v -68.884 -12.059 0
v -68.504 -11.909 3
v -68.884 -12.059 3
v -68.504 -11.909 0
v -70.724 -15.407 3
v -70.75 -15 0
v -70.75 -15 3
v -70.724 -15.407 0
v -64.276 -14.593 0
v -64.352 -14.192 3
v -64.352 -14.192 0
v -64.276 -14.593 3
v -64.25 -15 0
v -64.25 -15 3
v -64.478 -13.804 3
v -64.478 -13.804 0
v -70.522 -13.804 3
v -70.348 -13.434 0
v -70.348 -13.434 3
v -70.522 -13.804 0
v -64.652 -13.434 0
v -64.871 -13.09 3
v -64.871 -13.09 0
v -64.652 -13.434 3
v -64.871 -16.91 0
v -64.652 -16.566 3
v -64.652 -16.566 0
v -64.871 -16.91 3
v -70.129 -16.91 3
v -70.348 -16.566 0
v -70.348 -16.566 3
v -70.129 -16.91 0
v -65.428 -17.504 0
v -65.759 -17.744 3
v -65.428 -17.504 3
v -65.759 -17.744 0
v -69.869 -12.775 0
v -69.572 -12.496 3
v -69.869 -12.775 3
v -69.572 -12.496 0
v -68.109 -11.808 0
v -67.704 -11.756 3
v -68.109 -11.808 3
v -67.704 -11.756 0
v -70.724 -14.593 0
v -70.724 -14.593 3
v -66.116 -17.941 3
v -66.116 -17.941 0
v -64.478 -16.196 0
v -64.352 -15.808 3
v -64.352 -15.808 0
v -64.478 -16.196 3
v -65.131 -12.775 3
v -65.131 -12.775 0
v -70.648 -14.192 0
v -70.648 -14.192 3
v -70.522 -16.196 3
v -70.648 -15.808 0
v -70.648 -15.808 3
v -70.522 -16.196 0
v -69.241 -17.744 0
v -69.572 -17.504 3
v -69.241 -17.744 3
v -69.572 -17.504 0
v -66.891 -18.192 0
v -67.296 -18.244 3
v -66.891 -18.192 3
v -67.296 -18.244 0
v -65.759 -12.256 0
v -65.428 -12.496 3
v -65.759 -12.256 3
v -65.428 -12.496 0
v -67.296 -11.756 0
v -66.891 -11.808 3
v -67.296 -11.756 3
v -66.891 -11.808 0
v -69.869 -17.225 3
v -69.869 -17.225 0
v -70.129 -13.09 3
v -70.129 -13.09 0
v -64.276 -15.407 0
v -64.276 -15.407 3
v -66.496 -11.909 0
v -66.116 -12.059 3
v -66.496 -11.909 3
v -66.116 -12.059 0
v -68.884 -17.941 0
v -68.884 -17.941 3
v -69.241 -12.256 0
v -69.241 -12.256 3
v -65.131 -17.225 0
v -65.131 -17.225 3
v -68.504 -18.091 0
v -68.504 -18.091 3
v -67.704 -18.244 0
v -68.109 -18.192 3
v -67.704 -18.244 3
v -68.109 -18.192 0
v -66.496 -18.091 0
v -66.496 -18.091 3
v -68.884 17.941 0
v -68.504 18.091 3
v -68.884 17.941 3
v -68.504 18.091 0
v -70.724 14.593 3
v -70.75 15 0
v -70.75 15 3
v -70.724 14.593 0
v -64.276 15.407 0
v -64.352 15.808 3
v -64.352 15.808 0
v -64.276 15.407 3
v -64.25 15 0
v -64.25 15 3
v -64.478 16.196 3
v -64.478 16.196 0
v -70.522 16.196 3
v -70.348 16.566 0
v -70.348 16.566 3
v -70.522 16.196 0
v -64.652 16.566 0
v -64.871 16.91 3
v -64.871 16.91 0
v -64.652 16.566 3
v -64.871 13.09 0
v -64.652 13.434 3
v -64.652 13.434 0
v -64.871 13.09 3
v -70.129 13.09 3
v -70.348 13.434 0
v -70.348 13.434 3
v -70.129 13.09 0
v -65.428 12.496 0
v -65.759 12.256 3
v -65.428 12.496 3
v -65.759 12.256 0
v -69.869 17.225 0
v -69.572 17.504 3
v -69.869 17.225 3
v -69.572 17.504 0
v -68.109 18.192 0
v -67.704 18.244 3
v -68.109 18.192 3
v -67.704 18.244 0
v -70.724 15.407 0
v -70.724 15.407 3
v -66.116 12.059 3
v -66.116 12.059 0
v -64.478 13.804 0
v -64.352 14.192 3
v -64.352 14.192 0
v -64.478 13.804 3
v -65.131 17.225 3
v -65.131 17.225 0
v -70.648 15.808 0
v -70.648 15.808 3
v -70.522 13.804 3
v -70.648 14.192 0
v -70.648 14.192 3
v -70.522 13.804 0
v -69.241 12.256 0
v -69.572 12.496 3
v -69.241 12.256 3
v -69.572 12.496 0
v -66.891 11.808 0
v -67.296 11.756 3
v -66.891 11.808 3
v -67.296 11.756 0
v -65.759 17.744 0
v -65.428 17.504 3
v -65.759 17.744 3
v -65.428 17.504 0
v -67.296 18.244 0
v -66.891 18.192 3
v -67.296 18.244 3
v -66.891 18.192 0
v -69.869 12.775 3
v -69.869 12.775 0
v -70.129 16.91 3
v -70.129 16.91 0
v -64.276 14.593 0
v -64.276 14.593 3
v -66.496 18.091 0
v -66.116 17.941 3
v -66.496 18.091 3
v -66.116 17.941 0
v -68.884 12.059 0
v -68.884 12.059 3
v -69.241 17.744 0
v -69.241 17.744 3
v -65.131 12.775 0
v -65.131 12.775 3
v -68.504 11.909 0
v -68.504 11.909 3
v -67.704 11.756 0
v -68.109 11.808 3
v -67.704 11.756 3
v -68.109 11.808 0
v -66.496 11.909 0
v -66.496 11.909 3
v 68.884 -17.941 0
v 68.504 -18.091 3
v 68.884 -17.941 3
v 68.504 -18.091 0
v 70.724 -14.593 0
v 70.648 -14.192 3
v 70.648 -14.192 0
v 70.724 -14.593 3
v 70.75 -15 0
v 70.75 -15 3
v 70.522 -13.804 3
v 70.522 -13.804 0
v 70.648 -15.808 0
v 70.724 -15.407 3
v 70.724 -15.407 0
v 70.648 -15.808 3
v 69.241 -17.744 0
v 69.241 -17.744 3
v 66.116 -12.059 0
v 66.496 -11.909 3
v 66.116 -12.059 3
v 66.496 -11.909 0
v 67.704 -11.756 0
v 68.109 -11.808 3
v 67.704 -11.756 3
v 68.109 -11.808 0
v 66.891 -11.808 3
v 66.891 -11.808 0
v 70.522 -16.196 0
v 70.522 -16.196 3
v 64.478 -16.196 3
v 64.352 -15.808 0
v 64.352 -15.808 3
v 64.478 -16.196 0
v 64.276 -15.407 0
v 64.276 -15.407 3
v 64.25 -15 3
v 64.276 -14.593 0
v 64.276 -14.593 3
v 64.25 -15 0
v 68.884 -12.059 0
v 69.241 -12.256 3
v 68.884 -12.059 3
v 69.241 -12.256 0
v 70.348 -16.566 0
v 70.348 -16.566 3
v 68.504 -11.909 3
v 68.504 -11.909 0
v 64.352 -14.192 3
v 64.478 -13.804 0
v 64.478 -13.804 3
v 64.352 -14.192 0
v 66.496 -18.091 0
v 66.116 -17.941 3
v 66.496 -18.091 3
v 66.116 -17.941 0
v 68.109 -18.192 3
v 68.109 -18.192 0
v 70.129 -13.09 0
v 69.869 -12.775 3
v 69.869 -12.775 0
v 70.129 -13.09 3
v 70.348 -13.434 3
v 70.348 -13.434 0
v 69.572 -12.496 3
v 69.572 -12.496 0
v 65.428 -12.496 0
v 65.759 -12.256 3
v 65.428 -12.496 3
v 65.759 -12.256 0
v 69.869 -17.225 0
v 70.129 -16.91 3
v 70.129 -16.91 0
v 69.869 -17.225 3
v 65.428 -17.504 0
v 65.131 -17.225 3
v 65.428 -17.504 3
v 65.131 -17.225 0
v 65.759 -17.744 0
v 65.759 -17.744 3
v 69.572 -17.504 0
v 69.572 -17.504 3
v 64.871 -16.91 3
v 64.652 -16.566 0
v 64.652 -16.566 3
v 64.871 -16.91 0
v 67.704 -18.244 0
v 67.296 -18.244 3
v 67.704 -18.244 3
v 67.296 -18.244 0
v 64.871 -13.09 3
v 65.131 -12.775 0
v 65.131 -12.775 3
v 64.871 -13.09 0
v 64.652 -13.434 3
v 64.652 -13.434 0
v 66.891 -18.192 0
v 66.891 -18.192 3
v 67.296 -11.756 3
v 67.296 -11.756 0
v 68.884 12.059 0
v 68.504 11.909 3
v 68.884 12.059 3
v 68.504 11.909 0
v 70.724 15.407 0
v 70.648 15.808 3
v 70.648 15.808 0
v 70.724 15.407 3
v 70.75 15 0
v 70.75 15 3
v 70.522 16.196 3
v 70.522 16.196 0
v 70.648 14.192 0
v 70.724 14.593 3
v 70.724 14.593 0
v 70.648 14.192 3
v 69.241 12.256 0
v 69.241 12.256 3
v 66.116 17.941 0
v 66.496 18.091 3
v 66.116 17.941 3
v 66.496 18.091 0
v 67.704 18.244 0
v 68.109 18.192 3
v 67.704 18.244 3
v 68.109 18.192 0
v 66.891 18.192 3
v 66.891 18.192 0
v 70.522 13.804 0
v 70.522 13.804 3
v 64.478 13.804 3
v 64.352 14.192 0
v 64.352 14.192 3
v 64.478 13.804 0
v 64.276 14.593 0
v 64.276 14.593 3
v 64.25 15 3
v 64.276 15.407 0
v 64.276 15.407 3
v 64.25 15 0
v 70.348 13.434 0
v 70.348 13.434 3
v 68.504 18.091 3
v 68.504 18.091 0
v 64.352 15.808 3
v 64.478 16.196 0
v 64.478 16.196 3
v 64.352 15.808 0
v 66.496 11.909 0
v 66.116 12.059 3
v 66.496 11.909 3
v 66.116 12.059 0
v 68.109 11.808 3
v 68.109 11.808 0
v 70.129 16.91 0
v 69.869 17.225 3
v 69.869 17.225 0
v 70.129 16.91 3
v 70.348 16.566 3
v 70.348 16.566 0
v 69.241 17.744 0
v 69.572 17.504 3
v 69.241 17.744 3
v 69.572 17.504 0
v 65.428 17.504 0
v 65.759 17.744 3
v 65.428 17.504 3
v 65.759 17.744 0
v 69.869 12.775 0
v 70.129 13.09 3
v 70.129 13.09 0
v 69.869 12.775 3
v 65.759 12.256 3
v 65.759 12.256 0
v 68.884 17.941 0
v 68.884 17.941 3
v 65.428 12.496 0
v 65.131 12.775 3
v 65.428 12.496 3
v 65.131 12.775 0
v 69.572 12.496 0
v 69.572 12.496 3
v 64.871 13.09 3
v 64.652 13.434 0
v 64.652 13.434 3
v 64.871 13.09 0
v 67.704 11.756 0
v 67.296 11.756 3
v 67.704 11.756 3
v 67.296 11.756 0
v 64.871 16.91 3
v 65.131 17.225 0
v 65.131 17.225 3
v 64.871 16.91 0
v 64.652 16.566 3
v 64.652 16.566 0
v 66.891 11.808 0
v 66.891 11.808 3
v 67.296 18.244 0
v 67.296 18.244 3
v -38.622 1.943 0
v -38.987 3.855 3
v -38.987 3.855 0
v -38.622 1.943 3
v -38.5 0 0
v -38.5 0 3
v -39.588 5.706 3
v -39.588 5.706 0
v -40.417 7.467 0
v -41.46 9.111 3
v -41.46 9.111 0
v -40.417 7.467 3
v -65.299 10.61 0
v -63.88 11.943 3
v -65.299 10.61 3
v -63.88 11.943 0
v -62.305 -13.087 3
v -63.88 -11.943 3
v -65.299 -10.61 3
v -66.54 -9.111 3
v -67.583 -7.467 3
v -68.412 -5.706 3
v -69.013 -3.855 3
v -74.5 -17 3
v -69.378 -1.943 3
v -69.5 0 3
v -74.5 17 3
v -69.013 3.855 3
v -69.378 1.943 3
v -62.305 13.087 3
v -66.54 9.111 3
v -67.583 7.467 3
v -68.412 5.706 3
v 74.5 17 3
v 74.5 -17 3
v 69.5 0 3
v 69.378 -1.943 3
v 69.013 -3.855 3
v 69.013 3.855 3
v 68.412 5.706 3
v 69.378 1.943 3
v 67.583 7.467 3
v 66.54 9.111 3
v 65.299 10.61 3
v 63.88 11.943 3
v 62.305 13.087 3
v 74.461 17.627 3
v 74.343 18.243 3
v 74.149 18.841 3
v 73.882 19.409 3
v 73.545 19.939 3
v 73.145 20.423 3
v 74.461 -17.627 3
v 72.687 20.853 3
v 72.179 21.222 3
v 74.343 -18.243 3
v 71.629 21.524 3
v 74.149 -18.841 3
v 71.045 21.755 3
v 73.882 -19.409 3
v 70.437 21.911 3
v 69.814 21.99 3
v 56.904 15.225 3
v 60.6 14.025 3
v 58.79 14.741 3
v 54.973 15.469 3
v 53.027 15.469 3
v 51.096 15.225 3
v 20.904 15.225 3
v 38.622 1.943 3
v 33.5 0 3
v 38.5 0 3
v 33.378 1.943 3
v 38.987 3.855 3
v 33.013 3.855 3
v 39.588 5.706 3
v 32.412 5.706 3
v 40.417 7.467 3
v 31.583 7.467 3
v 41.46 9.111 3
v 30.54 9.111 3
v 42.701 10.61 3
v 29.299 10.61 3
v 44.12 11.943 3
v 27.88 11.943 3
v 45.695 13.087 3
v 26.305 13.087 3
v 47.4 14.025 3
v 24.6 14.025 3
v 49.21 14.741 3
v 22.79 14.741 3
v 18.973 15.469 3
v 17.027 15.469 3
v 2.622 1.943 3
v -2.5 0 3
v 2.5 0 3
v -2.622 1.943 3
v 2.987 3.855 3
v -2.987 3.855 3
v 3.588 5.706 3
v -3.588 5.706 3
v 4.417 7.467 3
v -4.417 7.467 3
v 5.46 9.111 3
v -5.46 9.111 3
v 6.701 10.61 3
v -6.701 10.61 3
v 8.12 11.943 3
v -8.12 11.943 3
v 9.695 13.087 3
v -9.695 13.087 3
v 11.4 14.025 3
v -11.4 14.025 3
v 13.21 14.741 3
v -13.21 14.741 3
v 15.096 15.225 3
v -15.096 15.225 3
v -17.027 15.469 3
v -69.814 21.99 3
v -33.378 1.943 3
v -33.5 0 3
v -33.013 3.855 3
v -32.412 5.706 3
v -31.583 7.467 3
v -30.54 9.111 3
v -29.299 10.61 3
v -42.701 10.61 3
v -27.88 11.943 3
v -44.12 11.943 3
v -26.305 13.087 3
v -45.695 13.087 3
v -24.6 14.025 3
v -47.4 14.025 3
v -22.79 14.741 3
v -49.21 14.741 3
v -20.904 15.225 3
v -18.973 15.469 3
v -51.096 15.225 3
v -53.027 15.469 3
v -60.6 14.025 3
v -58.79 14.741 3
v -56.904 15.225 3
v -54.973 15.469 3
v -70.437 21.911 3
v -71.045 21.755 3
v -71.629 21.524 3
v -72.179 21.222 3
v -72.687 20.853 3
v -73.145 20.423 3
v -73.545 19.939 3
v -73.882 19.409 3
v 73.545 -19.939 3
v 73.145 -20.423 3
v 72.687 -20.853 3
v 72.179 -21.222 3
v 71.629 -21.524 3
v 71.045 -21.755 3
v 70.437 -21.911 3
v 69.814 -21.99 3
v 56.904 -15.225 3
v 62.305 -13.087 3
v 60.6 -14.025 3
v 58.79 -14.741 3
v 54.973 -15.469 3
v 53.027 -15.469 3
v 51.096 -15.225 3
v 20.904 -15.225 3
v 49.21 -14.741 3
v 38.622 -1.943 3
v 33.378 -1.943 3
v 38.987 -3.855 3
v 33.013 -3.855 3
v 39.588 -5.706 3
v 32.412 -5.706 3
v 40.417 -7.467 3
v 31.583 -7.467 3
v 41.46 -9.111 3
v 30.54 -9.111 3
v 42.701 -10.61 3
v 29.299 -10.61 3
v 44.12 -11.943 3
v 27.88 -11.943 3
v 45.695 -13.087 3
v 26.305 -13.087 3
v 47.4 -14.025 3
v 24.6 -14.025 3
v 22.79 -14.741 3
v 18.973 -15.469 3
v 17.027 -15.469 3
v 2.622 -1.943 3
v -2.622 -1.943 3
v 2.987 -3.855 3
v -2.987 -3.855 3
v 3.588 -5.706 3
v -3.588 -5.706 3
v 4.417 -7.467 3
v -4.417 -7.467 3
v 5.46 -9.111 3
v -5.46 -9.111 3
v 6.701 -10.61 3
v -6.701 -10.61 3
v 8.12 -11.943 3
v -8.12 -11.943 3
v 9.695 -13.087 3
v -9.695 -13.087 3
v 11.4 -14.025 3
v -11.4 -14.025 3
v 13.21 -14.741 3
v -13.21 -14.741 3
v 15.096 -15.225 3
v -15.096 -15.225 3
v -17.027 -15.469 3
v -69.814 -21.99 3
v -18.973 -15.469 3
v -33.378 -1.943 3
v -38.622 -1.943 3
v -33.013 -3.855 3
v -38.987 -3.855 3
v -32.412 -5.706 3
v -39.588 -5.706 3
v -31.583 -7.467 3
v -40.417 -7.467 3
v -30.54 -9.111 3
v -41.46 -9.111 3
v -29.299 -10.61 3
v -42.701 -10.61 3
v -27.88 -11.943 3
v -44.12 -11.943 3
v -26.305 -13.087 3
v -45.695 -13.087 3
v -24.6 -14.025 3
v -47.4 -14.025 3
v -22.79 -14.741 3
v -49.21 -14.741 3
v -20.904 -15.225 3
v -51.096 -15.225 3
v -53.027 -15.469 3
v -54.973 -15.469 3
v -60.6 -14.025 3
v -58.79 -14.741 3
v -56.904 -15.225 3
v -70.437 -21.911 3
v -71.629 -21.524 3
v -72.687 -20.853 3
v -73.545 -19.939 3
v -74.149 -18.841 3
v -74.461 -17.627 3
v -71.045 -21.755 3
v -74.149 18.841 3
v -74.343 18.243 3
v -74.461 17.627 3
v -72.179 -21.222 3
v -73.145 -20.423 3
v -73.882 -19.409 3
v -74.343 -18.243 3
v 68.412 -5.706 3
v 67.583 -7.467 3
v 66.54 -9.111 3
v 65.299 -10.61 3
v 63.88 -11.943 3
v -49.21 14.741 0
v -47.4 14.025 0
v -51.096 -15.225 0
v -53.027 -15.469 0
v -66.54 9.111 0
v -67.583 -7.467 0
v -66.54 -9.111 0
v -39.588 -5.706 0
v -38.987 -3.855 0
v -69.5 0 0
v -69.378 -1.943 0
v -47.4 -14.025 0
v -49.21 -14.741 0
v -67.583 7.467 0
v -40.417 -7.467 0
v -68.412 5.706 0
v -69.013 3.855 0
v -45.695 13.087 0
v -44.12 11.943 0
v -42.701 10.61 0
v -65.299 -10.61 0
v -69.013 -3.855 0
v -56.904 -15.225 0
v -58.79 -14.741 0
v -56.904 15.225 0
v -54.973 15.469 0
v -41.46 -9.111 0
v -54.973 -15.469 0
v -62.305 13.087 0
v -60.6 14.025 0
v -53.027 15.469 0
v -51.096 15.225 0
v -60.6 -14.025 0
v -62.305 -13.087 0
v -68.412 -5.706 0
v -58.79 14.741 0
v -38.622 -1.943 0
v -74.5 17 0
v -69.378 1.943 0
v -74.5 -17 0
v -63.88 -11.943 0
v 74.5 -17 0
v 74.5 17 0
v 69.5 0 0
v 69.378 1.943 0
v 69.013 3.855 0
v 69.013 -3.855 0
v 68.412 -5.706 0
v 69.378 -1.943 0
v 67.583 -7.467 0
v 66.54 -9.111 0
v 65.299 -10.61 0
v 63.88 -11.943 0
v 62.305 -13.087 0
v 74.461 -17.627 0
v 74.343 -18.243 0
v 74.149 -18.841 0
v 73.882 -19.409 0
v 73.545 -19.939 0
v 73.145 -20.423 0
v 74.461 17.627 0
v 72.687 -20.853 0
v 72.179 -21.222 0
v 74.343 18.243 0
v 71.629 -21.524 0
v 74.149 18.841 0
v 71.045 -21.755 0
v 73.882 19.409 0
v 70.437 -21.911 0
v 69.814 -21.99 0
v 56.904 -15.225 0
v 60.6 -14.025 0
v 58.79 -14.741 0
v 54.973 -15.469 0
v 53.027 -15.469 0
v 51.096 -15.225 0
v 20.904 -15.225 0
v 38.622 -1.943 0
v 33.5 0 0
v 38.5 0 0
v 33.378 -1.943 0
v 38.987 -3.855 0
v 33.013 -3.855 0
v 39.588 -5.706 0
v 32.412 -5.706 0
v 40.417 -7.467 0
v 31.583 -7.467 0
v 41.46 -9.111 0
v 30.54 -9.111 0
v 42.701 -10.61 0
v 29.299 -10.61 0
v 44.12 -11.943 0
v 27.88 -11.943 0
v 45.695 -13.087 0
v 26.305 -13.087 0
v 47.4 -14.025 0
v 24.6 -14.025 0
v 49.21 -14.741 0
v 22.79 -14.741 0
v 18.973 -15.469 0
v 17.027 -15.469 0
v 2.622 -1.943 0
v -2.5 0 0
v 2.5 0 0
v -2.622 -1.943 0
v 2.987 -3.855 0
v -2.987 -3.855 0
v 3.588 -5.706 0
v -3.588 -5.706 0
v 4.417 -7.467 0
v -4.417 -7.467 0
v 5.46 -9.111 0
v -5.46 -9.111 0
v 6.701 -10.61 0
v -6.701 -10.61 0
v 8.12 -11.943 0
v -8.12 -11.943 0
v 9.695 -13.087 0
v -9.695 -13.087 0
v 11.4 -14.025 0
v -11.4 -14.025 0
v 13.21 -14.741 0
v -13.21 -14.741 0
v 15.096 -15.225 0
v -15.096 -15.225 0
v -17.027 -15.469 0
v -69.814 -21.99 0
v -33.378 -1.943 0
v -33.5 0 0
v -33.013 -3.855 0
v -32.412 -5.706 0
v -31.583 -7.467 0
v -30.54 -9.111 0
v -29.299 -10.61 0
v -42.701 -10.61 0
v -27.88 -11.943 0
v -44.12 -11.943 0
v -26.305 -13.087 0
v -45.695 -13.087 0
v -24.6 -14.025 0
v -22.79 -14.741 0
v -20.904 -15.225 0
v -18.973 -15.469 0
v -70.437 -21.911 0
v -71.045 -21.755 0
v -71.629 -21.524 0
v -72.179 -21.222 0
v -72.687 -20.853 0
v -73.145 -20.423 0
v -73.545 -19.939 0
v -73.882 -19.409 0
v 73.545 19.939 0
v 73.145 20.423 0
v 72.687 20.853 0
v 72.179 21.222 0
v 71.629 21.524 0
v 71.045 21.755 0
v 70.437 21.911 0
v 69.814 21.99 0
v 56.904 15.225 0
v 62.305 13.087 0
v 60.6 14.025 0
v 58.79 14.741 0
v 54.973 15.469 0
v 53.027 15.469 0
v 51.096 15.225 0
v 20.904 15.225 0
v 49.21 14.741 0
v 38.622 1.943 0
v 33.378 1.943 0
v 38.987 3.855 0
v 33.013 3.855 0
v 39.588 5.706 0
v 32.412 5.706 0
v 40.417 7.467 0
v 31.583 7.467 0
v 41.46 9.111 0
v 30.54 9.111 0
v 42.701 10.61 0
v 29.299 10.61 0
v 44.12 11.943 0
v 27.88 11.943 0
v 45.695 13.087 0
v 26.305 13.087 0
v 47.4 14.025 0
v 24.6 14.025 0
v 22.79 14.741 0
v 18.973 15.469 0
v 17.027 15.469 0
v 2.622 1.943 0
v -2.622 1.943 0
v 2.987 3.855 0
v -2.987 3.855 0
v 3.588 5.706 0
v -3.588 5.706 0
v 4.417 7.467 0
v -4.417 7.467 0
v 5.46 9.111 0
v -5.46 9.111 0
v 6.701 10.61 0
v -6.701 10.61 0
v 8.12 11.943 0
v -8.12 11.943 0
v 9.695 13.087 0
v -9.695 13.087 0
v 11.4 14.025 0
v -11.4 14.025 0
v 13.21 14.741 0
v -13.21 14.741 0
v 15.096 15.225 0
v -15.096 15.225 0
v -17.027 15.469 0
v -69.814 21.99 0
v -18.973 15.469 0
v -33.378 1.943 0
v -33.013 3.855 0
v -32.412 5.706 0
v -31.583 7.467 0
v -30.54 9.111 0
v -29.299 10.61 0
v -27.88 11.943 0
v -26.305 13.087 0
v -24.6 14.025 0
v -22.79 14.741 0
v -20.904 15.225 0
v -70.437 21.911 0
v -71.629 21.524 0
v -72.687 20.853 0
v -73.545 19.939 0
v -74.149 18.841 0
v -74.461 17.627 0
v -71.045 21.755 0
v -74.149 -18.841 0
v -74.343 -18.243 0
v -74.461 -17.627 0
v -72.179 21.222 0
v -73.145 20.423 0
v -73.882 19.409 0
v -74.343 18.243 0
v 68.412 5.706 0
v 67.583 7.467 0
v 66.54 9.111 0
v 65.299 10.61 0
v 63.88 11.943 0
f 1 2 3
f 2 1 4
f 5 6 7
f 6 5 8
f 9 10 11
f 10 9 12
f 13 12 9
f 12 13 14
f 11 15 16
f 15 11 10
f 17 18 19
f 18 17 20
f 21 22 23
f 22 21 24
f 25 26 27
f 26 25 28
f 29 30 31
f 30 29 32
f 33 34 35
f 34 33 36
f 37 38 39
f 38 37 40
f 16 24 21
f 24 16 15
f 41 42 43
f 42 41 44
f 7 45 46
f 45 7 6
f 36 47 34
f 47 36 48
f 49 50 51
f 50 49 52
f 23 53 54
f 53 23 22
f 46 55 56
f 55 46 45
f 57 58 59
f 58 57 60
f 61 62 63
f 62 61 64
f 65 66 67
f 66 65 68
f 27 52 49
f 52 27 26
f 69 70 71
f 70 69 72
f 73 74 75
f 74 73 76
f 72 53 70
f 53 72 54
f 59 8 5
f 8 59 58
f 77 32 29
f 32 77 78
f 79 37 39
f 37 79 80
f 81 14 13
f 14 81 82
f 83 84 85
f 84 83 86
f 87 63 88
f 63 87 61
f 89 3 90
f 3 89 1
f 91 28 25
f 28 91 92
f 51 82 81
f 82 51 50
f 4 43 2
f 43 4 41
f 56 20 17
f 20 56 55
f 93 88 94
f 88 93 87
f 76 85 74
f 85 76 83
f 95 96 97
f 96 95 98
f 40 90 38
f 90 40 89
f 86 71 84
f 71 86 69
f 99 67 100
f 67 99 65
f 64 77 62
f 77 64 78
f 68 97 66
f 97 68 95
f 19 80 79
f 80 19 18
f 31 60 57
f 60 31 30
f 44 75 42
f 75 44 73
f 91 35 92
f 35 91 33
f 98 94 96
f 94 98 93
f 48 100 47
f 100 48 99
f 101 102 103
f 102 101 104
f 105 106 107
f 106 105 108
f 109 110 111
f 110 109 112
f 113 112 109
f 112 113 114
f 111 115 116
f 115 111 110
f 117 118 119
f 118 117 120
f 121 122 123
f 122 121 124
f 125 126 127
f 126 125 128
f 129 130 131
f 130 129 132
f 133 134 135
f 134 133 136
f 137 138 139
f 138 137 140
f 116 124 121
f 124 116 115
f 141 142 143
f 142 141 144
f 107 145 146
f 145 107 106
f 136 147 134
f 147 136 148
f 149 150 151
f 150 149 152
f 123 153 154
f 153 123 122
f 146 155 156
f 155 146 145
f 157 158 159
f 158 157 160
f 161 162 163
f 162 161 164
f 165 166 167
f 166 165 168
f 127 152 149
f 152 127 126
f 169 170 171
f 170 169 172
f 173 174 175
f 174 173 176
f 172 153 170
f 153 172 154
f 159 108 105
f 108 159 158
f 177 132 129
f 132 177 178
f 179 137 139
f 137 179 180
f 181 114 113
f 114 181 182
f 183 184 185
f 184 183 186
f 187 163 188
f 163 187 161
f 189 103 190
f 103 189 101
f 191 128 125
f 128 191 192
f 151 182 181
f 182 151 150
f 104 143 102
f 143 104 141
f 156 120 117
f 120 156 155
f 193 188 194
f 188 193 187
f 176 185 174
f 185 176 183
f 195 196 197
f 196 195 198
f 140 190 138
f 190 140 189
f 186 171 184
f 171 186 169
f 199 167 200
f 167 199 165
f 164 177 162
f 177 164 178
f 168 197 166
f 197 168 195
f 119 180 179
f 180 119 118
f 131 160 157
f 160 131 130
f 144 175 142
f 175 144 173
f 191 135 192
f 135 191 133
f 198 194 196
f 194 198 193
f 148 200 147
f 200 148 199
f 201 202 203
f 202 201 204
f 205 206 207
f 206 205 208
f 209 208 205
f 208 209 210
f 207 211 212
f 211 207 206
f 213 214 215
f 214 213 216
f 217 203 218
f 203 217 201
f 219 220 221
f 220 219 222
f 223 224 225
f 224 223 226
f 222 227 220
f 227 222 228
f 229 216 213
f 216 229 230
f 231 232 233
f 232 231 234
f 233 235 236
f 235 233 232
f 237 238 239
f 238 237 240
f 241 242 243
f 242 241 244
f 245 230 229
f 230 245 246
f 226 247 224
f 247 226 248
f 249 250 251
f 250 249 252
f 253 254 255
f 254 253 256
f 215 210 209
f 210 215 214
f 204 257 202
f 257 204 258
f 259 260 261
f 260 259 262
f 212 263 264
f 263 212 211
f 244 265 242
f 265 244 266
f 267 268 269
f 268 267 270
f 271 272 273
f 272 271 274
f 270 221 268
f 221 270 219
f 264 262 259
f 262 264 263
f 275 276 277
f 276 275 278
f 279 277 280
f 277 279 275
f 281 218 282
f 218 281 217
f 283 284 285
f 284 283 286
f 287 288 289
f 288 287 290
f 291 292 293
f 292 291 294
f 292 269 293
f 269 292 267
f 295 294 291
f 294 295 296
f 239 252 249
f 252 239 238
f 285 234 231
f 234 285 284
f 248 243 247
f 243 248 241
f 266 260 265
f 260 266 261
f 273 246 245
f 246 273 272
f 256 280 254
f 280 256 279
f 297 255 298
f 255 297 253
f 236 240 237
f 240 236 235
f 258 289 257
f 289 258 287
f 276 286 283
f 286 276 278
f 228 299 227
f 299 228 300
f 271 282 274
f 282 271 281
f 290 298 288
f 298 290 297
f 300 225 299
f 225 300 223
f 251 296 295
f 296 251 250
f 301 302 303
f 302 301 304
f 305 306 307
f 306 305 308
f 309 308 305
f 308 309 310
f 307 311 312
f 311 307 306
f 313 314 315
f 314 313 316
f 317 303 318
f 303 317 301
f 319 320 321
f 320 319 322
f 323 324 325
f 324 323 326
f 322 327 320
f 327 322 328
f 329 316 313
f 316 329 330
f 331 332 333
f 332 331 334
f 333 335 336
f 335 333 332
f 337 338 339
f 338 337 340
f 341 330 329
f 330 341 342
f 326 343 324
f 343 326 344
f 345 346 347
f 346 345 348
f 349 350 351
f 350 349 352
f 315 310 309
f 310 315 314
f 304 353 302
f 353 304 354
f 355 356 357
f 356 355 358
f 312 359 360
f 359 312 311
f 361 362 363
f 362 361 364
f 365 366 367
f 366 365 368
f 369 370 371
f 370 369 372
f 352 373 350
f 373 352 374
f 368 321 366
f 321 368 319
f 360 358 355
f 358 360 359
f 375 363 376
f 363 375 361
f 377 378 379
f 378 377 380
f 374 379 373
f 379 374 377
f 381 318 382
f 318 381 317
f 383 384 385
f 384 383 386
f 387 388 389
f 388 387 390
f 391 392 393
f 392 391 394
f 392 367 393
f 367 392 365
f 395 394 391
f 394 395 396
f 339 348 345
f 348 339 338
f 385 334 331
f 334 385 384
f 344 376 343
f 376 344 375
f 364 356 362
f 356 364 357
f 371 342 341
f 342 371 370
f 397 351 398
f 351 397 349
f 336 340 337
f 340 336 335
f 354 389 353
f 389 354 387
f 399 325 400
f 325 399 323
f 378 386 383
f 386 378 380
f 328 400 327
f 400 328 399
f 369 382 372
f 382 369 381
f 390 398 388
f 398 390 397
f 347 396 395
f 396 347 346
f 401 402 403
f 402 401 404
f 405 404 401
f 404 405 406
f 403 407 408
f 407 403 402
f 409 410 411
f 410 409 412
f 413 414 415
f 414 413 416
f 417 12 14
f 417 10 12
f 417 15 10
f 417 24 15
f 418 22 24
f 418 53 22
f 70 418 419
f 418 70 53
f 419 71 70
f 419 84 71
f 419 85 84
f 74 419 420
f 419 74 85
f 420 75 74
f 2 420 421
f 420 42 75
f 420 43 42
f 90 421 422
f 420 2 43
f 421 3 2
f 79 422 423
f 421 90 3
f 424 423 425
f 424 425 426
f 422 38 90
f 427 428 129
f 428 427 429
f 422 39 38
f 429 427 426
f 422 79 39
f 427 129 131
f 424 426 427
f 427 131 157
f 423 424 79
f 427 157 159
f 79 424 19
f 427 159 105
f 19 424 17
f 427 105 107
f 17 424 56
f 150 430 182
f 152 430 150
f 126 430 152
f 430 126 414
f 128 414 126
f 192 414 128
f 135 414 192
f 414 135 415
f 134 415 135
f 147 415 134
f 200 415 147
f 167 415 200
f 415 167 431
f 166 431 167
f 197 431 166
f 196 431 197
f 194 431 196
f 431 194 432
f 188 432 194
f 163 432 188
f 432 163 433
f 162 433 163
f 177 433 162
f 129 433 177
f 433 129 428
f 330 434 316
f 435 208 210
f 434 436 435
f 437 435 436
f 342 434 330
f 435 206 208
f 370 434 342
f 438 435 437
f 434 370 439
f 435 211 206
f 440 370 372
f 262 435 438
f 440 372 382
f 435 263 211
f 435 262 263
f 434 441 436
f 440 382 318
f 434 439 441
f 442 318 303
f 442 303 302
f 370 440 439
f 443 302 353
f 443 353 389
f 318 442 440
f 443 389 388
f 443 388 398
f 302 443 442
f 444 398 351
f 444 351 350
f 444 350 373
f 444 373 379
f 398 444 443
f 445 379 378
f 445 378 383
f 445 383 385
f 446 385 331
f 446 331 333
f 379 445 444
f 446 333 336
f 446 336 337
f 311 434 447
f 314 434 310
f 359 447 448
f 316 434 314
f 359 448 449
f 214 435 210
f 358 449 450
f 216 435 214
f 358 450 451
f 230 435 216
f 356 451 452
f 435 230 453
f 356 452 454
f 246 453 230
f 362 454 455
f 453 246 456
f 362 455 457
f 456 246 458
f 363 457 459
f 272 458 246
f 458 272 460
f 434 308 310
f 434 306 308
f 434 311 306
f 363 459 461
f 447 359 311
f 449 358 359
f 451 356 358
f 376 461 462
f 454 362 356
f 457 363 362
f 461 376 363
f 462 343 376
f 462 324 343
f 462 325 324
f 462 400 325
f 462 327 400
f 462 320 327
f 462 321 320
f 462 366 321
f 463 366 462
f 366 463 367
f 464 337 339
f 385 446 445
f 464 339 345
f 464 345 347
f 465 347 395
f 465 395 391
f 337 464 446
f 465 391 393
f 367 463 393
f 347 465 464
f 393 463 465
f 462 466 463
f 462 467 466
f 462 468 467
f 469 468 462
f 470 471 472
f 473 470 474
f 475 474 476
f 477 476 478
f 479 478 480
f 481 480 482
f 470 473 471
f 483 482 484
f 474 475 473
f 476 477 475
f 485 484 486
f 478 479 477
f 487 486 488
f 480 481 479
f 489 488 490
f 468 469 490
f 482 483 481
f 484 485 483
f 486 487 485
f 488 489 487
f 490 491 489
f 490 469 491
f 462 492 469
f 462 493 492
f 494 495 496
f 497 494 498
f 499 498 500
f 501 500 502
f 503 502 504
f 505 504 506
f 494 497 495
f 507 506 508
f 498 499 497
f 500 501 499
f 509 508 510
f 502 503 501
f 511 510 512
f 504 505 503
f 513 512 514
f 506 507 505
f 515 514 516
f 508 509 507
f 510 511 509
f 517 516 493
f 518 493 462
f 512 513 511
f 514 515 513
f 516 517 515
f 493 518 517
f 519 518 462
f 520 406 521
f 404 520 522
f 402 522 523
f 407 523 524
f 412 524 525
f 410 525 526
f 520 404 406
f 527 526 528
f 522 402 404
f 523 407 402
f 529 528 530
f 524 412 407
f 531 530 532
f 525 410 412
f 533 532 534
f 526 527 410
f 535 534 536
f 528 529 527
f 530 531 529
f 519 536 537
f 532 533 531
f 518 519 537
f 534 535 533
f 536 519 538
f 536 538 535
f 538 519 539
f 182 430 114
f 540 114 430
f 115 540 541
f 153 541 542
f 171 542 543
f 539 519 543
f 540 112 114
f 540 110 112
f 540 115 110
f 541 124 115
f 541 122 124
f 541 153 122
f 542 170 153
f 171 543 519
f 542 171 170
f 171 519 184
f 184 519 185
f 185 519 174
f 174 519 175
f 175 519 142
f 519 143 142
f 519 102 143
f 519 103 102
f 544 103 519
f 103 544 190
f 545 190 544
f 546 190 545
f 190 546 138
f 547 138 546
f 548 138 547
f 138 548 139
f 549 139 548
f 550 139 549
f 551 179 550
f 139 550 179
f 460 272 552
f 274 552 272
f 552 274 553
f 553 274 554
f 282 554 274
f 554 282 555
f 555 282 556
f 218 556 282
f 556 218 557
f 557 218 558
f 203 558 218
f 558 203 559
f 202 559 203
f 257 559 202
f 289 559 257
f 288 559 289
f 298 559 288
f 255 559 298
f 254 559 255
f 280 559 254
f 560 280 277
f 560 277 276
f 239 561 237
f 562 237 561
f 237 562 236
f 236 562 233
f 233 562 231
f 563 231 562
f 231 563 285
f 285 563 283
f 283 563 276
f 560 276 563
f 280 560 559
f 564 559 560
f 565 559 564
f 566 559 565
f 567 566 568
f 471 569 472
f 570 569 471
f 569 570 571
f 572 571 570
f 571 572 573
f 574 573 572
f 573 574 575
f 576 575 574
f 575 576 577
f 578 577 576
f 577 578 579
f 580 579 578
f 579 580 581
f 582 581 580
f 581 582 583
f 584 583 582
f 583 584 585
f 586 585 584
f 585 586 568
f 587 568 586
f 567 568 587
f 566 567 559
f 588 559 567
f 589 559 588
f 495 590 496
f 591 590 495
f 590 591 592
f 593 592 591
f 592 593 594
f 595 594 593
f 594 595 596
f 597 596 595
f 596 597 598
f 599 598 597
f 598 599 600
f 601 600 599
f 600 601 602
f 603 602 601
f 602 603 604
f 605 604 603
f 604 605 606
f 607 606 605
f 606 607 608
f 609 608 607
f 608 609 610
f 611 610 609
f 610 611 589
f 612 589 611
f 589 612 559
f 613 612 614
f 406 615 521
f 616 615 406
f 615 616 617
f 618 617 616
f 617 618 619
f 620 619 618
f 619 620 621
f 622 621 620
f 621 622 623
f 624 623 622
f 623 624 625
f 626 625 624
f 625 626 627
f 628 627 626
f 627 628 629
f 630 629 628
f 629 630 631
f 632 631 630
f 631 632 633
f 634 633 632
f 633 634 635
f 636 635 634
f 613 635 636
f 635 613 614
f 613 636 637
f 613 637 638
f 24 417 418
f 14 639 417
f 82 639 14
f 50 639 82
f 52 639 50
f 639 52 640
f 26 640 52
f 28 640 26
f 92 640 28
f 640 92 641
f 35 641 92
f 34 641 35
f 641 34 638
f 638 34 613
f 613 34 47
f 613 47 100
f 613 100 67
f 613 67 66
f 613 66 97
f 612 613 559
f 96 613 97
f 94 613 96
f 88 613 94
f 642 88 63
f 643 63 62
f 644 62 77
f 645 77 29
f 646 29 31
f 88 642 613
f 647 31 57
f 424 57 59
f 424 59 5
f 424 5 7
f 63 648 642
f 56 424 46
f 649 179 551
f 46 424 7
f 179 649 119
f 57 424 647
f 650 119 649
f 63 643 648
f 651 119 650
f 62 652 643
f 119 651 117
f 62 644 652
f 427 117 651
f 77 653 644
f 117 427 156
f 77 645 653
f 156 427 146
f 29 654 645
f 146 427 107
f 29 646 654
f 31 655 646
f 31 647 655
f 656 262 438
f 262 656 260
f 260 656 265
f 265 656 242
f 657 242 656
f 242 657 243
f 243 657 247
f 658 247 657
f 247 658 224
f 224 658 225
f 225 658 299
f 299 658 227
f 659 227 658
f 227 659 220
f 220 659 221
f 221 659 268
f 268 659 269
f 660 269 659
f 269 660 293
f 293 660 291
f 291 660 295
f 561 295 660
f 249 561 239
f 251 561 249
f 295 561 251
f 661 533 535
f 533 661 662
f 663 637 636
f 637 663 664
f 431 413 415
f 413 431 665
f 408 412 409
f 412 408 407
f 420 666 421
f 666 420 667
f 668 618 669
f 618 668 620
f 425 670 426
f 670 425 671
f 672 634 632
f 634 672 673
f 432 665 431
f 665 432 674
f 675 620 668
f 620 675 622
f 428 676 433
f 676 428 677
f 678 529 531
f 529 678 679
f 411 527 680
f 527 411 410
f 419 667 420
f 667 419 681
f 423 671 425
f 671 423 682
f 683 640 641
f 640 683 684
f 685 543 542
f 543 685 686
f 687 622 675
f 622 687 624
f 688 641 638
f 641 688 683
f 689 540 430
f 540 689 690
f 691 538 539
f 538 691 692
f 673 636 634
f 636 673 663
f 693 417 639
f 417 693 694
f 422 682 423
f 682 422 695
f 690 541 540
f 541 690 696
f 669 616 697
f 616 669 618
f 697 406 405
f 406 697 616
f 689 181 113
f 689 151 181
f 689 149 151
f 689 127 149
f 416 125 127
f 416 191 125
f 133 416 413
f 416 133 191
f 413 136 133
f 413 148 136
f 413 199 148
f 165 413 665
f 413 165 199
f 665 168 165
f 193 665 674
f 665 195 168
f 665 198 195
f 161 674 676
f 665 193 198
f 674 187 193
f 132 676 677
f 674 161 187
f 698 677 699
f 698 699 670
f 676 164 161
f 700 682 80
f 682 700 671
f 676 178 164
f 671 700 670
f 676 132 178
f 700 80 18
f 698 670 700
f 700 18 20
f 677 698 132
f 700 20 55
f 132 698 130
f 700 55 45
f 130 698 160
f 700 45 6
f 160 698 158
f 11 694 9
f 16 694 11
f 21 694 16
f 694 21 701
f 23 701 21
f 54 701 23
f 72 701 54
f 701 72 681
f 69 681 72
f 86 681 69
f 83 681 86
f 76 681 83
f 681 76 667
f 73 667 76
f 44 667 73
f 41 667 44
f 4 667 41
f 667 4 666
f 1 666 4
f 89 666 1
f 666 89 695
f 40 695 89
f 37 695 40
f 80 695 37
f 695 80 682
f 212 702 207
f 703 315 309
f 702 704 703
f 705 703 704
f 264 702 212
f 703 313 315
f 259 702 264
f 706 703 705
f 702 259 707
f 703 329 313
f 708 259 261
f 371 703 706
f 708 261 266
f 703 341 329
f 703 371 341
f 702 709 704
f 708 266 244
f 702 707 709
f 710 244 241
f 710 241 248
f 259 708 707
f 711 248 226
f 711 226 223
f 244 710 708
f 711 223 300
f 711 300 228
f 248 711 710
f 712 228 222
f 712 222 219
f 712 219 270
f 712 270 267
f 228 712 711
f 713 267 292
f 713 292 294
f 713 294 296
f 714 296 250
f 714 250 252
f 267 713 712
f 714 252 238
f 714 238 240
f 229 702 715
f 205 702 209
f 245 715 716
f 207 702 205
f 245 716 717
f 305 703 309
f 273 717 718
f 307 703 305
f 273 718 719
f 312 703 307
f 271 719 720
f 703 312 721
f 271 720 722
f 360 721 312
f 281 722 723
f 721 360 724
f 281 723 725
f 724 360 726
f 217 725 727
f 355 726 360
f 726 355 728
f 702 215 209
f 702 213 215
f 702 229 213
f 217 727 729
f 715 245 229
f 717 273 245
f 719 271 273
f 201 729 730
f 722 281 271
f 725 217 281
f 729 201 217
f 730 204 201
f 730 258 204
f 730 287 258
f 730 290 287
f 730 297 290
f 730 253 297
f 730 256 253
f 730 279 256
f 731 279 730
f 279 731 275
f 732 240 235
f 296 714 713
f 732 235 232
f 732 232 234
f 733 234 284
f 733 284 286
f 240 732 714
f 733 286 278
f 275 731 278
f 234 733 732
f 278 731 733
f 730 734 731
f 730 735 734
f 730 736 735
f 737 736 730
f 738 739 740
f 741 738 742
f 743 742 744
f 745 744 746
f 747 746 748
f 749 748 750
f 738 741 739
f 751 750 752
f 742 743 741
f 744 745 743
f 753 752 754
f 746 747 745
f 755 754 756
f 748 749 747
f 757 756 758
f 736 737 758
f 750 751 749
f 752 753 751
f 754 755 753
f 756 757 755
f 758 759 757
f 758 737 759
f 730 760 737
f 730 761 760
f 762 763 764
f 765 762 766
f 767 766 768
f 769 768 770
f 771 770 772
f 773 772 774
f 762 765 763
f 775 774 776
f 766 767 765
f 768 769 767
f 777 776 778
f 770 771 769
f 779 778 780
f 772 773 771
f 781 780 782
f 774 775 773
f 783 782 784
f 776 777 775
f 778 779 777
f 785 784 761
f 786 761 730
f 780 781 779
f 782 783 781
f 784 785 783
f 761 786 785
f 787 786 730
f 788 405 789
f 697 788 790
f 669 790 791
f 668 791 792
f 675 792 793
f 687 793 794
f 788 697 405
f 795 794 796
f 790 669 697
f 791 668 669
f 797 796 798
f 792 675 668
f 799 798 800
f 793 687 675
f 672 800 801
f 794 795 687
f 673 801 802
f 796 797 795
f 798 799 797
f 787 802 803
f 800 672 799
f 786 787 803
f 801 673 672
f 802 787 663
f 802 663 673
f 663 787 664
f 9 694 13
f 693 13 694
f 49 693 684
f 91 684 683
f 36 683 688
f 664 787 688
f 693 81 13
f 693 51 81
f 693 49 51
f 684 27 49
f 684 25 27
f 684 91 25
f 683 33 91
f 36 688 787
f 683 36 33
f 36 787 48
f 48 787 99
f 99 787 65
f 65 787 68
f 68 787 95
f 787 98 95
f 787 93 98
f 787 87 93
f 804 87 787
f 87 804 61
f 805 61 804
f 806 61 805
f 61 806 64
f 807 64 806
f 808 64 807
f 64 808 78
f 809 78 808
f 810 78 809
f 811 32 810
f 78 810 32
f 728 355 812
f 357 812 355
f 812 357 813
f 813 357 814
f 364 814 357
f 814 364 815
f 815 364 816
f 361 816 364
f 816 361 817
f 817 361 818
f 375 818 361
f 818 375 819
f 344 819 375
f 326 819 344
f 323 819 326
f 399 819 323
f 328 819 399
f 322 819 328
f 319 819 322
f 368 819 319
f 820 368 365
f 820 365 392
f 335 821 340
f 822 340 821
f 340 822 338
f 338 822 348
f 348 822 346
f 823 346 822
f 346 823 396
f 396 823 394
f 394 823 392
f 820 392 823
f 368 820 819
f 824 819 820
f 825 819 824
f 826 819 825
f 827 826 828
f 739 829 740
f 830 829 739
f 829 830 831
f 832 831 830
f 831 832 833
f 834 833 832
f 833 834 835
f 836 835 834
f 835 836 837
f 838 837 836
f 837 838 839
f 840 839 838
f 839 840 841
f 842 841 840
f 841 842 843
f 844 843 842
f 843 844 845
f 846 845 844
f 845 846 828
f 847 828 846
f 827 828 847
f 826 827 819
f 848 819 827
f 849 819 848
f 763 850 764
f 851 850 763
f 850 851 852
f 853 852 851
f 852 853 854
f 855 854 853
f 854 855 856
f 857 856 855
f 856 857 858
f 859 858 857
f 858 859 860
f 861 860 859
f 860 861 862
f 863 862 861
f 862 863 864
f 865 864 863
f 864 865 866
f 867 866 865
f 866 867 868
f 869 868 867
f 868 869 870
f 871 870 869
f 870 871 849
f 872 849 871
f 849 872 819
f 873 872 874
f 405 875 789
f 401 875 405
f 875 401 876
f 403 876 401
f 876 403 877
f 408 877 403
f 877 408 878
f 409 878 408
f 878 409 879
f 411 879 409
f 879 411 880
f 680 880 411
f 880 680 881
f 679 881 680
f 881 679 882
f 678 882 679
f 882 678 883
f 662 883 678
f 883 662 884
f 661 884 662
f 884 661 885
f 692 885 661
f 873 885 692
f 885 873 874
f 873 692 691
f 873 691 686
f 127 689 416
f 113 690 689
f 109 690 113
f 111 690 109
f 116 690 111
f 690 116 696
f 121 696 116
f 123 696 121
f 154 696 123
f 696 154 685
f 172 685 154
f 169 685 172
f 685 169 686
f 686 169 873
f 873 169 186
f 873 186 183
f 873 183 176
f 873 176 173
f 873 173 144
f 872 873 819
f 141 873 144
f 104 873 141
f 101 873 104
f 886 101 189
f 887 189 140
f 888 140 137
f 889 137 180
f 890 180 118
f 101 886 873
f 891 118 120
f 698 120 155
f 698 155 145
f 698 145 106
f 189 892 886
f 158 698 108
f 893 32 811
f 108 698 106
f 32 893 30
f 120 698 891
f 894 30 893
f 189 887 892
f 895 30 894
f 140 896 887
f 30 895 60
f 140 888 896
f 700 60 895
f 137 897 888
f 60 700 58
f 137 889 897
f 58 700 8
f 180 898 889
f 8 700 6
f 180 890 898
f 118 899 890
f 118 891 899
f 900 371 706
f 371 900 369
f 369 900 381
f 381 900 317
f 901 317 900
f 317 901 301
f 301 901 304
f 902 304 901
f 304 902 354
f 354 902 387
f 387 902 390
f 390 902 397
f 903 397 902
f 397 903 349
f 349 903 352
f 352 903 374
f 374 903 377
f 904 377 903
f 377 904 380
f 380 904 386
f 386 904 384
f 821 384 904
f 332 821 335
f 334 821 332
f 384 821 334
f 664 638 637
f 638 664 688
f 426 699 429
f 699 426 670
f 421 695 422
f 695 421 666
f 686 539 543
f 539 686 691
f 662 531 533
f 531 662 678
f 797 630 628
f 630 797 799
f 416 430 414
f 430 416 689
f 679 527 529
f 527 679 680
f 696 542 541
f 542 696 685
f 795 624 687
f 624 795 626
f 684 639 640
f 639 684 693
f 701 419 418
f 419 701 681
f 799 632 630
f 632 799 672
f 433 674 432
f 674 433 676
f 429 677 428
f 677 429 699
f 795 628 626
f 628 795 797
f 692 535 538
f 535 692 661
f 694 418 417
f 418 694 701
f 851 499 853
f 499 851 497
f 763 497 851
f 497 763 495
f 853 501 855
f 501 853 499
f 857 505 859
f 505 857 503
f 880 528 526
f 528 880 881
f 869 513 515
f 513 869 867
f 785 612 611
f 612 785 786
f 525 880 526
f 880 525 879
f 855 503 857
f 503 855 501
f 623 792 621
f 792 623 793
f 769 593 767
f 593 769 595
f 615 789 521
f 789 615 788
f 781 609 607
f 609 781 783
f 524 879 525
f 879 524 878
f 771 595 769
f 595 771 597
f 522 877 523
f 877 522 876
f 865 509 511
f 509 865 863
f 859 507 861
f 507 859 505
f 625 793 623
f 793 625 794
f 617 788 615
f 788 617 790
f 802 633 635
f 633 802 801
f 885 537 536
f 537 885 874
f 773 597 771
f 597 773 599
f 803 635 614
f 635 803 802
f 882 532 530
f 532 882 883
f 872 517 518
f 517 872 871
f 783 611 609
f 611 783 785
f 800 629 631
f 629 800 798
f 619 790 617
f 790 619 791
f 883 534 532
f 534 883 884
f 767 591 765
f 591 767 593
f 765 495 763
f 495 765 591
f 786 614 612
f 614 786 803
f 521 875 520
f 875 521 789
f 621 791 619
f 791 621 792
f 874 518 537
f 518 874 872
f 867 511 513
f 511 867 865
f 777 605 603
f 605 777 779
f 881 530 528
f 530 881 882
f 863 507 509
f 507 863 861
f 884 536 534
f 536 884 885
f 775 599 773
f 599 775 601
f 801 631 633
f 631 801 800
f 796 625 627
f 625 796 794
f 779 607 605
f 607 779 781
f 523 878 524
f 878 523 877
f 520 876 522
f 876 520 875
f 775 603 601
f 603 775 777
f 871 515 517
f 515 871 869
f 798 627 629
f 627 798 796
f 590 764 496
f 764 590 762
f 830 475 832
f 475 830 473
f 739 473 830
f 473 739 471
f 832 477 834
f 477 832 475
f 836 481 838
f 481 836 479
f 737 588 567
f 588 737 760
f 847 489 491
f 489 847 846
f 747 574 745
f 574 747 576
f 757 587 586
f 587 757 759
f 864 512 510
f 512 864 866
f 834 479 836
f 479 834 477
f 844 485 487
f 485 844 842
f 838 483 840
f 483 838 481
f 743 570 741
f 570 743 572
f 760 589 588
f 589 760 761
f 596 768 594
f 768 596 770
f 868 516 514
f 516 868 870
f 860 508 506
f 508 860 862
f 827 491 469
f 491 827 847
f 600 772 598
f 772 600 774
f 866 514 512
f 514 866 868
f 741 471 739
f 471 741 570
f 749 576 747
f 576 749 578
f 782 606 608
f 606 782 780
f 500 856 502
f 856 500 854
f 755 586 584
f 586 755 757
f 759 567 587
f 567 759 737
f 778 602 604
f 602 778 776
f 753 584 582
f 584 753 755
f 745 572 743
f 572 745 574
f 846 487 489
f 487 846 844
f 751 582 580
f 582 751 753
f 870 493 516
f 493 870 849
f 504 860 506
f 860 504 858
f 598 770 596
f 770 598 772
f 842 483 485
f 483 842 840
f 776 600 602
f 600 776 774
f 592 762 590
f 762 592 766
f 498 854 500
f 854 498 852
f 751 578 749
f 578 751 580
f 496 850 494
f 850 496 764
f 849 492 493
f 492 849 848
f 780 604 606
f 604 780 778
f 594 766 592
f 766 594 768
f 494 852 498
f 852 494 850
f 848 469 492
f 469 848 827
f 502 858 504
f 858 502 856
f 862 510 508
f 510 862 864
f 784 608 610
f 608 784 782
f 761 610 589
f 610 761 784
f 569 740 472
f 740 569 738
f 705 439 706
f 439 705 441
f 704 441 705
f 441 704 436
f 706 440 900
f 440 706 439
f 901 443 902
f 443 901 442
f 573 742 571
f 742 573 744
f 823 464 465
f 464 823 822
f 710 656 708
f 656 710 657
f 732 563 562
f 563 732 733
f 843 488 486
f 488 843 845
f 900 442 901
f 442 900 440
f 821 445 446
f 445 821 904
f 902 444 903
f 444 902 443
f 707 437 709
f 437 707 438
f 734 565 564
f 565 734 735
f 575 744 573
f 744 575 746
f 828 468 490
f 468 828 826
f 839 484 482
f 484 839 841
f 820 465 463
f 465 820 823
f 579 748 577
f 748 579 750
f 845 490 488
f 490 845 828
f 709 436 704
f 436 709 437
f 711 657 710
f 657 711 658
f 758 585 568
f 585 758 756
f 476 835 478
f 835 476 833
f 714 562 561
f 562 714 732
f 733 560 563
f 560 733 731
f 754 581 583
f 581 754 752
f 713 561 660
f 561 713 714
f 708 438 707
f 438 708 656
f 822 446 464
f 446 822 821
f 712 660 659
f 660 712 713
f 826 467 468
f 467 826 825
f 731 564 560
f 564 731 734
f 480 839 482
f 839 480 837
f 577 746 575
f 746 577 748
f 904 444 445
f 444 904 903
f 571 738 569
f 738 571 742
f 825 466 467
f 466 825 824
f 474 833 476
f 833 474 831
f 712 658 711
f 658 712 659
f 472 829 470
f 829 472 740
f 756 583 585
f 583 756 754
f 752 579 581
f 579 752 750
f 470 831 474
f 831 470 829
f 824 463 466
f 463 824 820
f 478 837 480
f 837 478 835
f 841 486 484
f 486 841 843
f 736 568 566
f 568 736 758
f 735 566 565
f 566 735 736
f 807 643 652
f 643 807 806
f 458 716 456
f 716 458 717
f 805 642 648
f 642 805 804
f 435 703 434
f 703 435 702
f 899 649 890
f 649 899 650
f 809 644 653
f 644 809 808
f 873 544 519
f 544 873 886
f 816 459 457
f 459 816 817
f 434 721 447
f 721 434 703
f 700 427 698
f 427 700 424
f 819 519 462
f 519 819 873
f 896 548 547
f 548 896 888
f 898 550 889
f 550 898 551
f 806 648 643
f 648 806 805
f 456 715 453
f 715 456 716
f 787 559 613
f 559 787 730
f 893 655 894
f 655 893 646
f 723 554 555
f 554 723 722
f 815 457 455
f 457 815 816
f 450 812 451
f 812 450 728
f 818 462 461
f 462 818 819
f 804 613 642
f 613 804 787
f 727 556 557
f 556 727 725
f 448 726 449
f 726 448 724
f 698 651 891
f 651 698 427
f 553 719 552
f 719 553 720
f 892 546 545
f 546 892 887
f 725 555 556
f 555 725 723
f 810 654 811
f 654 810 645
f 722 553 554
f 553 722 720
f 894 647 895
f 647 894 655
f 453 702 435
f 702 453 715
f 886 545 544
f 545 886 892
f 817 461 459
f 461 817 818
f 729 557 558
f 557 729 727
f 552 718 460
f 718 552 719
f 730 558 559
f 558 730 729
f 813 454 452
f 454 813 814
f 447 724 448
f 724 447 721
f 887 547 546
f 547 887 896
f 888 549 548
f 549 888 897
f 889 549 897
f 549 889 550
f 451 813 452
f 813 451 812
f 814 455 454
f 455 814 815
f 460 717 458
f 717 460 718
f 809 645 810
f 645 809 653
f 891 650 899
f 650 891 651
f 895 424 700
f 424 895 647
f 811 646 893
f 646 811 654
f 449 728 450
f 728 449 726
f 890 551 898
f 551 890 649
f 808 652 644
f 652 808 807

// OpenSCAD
$fn = 50;


difference() {
	union() {
		hull() {
			translate(v = [-69.5000000000, 17.0000000000, 0]) {
				cylinder(h = 3, r = 5);
			}
			translate(v = [69.5000000000, 17.0000000000, 0]) {
				cylinder(h = 3, r = 5);
			}
			translate(v = [-69.5000000000, -17.0000000000, 0]) {
				cylinder(h = 3, r = 5);
			}
			translate(v = [69.5000000000, -17.0000000000, 0]) {
				cylinder(h = 3, r = 5);
			}
		}
	}
	union() {
		#translate(v = [-67.5000000000, -15.0000000000, -100.0000000000]) {
			cylinder(h = 200, r = 3.2500000000);
		}
		#translate(v = [-67.5000000000, 15.0000000000, -100.0000000000]) {
			cylinder(h = 200, r = 3.2500000000);
		}
		#translate(v = [67.5000000000, -15.0000000000, -100.0000000000]) {
			cylinder(h = 200, r = 3.2500000000);
		}
		#translate(v = [67.5000000000, 15.0000000000, -100.0000000000]) {
			cylinder(h = 200, r = 3.2500000000);
		}
		#translate(v = [-54.0000000000, 0, 0]) {
			cylinder(h = 3, r = 15.5000000000);
		}
		#translate(v = [-18.0000000000, 0, 0]) {
			cylinder(h = 3, r = 15.5000000000);
		}
		#translate(v = [18.0000000000, 0, 0]) {
			cylinder(h = 3, r = 15.5000000000);
		}
		#translate(v = [54.0000000000, 0, 0]) {
			cylinder(h = 3, r = 15.5000000000);
		}
	}
}
